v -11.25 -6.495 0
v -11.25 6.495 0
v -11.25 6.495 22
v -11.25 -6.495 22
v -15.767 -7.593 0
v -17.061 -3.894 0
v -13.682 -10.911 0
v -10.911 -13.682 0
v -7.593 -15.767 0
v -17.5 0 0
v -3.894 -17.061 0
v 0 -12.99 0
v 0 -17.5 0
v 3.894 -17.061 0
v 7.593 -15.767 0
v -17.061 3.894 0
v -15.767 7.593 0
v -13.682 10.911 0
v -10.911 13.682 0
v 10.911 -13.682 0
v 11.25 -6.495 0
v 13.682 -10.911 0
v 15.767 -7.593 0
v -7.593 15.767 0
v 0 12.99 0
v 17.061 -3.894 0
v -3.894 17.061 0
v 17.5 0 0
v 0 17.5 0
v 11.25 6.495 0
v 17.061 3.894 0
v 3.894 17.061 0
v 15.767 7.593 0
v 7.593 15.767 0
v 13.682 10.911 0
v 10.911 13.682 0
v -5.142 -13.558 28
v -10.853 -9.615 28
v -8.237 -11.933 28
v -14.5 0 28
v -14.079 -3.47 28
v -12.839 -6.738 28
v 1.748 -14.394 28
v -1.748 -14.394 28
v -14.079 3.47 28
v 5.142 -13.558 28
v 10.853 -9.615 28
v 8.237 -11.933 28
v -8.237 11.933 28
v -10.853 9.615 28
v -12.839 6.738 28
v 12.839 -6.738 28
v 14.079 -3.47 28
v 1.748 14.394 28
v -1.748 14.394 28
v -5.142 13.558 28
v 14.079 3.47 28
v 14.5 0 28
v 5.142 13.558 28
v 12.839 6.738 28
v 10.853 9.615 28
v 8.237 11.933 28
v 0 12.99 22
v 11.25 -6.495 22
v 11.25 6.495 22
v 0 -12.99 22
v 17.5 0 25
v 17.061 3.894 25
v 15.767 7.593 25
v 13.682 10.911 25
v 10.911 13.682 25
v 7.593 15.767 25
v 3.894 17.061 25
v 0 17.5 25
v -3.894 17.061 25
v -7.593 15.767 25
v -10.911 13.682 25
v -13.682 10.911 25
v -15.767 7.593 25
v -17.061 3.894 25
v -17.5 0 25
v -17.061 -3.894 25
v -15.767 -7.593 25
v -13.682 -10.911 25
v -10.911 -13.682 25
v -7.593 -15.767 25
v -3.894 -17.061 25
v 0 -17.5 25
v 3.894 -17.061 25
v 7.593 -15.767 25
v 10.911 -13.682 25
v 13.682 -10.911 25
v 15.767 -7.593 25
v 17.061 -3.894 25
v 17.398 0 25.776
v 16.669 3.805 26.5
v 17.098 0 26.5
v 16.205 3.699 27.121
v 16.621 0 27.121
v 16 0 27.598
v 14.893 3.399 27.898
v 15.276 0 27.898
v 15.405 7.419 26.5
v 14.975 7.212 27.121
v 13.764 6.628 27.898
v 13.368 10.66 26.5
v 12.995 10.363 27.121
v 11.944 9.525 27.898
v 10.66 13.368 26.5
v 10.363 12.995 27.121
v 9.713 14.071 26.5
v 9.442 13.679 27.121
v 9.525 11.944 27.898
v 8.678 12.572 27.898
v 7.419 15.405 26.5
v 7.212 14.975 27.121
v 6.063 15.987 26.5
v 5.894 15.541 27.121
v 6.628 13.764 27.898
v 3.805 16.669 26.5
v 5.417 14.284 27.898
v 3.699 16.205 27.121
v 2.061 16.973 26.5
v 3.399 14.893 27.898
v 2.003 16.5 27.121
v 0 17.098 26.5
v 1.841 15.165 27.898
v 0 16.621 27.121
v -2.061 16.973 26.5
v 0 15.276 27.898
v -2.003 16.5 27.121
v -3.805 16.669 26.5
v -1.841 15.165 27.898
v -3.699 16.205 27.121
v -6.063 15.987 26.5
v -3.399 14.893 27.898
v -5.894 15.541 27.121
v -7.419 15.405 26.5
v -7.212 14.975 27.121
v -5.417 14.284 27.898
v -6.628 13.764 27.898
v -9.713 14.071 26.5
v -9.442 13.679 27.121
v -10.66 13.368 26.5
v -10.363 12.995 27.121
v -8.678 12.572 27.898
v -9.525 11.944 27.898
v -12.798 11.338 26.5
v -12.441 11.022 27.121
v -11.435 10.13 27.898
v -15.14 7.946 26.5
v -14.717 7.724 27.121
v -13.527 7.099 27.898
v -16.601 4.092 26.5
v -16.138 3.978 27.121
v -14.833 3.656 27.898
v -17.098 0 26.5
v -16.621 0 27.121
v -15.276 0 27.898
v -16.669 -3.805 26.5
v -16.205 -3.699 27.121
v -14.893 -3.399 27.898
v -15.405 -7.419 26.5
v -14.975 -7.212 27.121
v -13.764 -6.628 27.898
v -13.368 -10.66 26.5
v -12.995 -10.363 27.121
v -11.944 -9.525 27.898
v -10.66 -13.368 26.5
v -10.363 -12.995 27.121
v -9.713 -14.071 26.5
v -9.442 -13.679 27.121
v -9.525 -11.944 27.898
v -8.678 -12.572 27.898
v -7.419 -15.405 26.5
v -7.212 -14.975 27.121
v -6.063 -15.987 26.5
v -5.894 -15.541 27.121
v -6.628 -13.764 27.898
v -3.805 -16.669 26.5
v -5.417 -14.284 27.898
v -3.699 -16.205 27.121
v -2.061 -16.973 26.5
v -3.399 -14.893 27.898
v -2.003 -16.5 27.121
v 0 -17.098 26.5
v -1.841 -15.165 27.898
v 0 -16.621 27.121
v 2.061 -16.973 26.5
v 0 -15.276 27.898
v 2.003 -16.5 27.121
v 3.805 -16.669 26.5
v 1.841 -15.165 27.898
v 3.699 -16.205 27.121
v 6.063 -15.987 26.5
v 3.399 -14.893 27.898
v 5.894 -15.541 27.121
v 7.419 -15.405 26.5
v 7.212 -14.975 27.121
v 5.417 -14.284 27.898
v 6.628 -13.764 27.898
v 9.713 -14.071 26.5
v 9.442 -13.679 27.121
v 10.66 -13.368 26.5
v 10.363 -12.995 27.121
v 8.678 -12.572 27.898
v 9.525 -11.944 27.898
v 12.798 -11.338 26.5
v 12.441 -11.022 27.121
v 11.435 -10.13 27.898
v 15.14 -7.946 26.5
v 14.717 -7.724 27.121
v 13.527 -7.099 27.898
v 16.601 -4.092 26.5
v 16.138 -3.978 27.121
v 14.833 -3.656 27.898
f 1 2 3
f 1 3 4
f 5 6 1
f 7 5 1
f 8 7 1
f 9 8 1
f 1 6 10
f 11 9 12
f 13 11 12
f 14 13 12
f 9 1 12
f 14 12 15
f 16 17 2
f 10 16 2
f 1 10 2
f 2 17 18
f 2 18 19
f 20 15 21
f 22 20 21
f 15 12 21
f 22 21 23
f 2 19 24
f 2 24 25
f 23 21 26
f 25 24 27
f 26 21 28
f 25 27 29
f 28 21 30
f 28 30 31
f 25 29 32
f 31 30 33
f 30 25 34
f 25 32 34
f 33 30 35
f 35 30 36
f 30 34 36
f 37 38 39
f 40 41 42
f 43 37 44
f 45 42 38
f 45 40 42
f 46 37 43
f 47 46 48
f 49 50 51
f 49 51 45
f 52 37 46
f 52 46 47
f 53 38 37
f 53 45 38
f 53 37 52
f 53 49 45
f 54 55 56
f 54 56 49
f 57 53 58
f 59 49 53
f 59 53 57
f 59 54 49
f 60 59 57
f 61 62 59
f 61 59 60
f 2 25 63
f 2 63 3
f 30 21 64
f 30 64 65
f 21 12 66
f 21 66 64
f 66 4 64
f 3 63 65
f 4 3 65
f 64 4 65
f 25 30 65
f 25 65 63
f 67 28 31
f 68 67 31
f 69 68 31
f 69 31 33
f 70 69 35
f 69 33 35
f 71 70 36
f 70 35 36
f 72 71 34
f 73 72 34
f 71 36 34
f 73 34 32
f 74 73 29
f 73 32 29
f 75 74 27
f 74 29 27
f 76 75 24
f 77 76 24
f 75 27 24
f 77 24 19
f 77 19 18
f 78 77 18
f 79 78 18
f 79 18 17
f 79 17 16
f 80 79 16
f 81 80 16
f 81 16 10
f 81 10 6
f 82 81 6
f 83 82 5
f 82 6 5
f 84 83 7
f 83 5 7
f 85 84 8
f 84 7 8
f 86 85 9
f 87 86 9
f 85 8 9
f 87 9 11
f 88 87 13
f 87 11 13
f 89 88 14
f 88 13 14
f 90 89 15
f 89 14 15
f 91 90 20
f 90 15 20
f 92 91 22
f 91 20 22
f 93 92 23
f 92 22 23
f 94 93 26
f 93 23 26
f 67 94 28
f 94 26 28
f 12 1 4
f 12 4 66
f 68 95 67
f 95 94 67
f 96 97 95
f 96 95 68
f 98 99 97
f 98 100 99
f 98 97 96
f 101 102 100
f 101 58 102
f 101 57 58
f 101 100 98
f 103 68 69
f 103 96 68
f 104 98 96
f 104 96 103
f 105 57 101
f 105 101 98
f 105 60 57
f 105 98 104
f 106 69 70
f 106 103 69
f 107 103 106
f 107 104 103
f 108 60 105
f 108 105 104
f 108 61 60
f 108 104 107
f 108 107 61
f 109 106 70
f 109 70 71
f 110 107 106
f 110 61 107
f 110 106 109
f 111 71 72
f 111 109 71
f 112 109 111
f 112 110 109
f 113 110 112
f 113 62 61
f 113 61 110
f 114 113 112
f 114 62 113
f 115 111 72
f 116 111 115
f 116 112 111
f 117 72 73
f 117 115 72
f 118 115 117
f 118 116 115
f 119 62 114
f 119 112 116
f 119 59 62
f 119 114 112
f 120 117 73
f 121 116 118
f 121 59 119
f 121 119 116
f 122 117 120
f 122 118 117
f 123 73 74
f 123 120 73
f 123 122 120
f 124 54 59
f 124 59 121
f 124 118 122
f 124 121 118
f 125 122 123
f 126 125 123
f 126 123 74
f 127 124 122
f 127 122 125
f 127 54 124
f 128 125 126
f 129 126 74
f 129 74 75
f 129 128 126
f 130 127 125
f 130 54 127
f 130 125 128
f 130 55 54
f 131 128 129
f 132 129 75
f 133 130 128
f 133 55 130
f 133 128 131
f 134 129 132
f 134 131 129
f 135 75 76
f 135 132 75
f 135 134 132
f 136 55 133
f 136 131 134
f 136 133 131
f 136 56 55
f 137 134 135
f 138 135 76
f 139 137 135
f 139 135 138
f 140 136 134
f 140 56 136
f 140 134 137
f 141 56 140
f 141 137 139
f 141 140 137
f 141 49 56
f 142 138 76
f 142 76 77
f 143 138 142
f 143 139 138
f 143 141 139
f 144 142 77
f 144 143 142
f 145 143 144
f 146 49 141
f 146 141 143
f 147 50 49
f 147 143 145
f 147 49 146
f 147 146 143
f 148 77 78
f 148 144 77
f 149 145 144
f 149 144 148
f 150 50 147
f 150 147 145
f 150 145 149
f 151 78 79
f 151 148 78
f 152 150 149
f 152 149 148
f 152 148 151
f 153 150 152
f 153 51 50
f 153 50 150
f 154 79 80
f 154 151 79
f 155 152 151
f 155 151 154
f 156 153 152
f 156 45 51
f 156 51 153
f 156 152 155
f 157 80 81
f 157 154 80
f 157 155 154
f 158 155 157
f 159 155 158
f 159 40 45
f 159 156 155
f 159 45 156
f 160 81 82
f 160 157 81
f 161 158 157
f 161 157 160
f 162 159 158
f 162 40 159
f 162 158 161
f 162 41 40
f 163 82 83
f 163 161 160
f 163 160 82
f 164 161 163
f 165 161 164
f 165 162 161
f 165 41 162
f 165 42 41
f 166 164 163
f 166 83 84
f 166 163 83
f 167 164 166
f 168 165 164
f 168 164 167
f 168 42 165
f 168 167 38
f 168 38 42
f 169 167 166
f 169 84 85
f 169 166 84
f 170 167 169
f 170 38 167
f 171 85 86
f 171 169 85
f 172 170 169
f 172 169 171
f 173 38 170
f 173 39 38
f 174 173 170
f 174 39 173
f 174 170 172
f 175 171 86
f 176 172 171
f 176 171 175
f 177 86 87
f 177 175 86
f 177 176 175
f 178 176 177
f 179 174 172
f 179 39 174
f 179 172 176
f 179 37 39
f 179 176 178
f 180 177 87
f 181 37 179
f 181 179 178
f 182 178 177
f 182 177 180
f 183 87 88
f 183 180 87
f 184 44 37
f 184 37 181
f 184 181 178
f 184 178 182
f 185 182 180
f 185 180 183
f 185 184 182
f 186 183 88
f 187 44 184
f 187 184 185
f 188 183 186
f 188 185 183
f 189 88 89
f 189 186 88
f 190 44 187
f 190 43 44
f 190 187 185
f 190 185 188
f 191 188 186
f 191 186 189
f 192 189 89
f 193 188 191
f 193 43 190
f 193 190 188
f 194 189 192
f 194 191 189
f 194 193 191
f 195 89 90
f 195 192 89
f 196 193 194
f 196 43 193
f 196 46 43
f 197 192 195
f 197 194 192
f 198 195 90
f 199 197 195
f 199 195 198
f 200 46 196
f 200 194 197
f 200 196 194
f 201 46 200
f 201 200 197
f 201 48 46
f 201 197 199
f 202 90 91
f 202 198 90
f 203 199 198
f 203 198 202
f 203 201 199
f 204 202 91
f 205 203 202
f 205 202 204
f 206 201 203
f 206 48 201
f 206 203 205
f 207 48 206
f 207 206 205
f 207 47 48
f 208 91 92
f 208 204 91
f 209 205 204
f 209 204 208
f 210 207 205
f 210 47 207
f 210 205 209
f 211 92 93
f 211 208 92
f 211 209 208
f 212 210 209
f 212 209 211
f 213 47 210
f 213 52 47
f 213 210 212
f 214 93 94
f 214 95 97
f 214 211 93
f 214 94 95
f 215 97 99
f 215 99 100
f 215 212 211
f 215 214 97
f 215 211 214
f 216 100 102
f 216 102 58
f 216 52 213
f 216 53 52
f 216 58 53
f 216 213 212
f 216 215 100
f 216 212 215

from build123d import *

# Parameters (mm, degrees)
F0_R     = 17.5
F1_DEPTH = 28
F2_DEPTH = 22
F3_R     = 3


with BuildPart() as f1:
    # F0 (on Top) → F1 (new body)
    with BuildSketch(Plane.XY):
        Circle(F0_R)
        Polygon((-11.25, 6.4951905284), (0, 12.9903810568), (11.25, 6.4951905284), (11.25, -6.4951905284), (0, -12.9903810568), (-11.25, -6.4951905284), align=None, mode=Mode.SUBTRACT)
        Polygon((11.25, 6.4951905284), (0, 12.9903810568), (-11.25, 6.4951905284), (-11.25, -6.4951905284), (0, -12.9903810568), (11.25, -6.4951905284), align=None)
    extrude(amount=F1_DEPTH)

    # F0 (on Top) → F2 (cut)
    with BuildSketch(Plane.XY):
        Polygon((11.25, 6.4951905284), (0, 12.9903810568), (-11.25, 6.4951905284), (-11.25, -6.4951905284), (0, -12.9903810568), (11.25, -6.4951905284), align=None)
    extrude(amount=F2_DEPTH, mode=Mode.SUBTRACT)

    # F3
    f3_edges = [f1.edges().sort_by_distance(p)[0] for p in [
        (-17.5, 0, 28),
    ]]
    fillet(f3_edges, radius=F3_R)


solid = f1.part
